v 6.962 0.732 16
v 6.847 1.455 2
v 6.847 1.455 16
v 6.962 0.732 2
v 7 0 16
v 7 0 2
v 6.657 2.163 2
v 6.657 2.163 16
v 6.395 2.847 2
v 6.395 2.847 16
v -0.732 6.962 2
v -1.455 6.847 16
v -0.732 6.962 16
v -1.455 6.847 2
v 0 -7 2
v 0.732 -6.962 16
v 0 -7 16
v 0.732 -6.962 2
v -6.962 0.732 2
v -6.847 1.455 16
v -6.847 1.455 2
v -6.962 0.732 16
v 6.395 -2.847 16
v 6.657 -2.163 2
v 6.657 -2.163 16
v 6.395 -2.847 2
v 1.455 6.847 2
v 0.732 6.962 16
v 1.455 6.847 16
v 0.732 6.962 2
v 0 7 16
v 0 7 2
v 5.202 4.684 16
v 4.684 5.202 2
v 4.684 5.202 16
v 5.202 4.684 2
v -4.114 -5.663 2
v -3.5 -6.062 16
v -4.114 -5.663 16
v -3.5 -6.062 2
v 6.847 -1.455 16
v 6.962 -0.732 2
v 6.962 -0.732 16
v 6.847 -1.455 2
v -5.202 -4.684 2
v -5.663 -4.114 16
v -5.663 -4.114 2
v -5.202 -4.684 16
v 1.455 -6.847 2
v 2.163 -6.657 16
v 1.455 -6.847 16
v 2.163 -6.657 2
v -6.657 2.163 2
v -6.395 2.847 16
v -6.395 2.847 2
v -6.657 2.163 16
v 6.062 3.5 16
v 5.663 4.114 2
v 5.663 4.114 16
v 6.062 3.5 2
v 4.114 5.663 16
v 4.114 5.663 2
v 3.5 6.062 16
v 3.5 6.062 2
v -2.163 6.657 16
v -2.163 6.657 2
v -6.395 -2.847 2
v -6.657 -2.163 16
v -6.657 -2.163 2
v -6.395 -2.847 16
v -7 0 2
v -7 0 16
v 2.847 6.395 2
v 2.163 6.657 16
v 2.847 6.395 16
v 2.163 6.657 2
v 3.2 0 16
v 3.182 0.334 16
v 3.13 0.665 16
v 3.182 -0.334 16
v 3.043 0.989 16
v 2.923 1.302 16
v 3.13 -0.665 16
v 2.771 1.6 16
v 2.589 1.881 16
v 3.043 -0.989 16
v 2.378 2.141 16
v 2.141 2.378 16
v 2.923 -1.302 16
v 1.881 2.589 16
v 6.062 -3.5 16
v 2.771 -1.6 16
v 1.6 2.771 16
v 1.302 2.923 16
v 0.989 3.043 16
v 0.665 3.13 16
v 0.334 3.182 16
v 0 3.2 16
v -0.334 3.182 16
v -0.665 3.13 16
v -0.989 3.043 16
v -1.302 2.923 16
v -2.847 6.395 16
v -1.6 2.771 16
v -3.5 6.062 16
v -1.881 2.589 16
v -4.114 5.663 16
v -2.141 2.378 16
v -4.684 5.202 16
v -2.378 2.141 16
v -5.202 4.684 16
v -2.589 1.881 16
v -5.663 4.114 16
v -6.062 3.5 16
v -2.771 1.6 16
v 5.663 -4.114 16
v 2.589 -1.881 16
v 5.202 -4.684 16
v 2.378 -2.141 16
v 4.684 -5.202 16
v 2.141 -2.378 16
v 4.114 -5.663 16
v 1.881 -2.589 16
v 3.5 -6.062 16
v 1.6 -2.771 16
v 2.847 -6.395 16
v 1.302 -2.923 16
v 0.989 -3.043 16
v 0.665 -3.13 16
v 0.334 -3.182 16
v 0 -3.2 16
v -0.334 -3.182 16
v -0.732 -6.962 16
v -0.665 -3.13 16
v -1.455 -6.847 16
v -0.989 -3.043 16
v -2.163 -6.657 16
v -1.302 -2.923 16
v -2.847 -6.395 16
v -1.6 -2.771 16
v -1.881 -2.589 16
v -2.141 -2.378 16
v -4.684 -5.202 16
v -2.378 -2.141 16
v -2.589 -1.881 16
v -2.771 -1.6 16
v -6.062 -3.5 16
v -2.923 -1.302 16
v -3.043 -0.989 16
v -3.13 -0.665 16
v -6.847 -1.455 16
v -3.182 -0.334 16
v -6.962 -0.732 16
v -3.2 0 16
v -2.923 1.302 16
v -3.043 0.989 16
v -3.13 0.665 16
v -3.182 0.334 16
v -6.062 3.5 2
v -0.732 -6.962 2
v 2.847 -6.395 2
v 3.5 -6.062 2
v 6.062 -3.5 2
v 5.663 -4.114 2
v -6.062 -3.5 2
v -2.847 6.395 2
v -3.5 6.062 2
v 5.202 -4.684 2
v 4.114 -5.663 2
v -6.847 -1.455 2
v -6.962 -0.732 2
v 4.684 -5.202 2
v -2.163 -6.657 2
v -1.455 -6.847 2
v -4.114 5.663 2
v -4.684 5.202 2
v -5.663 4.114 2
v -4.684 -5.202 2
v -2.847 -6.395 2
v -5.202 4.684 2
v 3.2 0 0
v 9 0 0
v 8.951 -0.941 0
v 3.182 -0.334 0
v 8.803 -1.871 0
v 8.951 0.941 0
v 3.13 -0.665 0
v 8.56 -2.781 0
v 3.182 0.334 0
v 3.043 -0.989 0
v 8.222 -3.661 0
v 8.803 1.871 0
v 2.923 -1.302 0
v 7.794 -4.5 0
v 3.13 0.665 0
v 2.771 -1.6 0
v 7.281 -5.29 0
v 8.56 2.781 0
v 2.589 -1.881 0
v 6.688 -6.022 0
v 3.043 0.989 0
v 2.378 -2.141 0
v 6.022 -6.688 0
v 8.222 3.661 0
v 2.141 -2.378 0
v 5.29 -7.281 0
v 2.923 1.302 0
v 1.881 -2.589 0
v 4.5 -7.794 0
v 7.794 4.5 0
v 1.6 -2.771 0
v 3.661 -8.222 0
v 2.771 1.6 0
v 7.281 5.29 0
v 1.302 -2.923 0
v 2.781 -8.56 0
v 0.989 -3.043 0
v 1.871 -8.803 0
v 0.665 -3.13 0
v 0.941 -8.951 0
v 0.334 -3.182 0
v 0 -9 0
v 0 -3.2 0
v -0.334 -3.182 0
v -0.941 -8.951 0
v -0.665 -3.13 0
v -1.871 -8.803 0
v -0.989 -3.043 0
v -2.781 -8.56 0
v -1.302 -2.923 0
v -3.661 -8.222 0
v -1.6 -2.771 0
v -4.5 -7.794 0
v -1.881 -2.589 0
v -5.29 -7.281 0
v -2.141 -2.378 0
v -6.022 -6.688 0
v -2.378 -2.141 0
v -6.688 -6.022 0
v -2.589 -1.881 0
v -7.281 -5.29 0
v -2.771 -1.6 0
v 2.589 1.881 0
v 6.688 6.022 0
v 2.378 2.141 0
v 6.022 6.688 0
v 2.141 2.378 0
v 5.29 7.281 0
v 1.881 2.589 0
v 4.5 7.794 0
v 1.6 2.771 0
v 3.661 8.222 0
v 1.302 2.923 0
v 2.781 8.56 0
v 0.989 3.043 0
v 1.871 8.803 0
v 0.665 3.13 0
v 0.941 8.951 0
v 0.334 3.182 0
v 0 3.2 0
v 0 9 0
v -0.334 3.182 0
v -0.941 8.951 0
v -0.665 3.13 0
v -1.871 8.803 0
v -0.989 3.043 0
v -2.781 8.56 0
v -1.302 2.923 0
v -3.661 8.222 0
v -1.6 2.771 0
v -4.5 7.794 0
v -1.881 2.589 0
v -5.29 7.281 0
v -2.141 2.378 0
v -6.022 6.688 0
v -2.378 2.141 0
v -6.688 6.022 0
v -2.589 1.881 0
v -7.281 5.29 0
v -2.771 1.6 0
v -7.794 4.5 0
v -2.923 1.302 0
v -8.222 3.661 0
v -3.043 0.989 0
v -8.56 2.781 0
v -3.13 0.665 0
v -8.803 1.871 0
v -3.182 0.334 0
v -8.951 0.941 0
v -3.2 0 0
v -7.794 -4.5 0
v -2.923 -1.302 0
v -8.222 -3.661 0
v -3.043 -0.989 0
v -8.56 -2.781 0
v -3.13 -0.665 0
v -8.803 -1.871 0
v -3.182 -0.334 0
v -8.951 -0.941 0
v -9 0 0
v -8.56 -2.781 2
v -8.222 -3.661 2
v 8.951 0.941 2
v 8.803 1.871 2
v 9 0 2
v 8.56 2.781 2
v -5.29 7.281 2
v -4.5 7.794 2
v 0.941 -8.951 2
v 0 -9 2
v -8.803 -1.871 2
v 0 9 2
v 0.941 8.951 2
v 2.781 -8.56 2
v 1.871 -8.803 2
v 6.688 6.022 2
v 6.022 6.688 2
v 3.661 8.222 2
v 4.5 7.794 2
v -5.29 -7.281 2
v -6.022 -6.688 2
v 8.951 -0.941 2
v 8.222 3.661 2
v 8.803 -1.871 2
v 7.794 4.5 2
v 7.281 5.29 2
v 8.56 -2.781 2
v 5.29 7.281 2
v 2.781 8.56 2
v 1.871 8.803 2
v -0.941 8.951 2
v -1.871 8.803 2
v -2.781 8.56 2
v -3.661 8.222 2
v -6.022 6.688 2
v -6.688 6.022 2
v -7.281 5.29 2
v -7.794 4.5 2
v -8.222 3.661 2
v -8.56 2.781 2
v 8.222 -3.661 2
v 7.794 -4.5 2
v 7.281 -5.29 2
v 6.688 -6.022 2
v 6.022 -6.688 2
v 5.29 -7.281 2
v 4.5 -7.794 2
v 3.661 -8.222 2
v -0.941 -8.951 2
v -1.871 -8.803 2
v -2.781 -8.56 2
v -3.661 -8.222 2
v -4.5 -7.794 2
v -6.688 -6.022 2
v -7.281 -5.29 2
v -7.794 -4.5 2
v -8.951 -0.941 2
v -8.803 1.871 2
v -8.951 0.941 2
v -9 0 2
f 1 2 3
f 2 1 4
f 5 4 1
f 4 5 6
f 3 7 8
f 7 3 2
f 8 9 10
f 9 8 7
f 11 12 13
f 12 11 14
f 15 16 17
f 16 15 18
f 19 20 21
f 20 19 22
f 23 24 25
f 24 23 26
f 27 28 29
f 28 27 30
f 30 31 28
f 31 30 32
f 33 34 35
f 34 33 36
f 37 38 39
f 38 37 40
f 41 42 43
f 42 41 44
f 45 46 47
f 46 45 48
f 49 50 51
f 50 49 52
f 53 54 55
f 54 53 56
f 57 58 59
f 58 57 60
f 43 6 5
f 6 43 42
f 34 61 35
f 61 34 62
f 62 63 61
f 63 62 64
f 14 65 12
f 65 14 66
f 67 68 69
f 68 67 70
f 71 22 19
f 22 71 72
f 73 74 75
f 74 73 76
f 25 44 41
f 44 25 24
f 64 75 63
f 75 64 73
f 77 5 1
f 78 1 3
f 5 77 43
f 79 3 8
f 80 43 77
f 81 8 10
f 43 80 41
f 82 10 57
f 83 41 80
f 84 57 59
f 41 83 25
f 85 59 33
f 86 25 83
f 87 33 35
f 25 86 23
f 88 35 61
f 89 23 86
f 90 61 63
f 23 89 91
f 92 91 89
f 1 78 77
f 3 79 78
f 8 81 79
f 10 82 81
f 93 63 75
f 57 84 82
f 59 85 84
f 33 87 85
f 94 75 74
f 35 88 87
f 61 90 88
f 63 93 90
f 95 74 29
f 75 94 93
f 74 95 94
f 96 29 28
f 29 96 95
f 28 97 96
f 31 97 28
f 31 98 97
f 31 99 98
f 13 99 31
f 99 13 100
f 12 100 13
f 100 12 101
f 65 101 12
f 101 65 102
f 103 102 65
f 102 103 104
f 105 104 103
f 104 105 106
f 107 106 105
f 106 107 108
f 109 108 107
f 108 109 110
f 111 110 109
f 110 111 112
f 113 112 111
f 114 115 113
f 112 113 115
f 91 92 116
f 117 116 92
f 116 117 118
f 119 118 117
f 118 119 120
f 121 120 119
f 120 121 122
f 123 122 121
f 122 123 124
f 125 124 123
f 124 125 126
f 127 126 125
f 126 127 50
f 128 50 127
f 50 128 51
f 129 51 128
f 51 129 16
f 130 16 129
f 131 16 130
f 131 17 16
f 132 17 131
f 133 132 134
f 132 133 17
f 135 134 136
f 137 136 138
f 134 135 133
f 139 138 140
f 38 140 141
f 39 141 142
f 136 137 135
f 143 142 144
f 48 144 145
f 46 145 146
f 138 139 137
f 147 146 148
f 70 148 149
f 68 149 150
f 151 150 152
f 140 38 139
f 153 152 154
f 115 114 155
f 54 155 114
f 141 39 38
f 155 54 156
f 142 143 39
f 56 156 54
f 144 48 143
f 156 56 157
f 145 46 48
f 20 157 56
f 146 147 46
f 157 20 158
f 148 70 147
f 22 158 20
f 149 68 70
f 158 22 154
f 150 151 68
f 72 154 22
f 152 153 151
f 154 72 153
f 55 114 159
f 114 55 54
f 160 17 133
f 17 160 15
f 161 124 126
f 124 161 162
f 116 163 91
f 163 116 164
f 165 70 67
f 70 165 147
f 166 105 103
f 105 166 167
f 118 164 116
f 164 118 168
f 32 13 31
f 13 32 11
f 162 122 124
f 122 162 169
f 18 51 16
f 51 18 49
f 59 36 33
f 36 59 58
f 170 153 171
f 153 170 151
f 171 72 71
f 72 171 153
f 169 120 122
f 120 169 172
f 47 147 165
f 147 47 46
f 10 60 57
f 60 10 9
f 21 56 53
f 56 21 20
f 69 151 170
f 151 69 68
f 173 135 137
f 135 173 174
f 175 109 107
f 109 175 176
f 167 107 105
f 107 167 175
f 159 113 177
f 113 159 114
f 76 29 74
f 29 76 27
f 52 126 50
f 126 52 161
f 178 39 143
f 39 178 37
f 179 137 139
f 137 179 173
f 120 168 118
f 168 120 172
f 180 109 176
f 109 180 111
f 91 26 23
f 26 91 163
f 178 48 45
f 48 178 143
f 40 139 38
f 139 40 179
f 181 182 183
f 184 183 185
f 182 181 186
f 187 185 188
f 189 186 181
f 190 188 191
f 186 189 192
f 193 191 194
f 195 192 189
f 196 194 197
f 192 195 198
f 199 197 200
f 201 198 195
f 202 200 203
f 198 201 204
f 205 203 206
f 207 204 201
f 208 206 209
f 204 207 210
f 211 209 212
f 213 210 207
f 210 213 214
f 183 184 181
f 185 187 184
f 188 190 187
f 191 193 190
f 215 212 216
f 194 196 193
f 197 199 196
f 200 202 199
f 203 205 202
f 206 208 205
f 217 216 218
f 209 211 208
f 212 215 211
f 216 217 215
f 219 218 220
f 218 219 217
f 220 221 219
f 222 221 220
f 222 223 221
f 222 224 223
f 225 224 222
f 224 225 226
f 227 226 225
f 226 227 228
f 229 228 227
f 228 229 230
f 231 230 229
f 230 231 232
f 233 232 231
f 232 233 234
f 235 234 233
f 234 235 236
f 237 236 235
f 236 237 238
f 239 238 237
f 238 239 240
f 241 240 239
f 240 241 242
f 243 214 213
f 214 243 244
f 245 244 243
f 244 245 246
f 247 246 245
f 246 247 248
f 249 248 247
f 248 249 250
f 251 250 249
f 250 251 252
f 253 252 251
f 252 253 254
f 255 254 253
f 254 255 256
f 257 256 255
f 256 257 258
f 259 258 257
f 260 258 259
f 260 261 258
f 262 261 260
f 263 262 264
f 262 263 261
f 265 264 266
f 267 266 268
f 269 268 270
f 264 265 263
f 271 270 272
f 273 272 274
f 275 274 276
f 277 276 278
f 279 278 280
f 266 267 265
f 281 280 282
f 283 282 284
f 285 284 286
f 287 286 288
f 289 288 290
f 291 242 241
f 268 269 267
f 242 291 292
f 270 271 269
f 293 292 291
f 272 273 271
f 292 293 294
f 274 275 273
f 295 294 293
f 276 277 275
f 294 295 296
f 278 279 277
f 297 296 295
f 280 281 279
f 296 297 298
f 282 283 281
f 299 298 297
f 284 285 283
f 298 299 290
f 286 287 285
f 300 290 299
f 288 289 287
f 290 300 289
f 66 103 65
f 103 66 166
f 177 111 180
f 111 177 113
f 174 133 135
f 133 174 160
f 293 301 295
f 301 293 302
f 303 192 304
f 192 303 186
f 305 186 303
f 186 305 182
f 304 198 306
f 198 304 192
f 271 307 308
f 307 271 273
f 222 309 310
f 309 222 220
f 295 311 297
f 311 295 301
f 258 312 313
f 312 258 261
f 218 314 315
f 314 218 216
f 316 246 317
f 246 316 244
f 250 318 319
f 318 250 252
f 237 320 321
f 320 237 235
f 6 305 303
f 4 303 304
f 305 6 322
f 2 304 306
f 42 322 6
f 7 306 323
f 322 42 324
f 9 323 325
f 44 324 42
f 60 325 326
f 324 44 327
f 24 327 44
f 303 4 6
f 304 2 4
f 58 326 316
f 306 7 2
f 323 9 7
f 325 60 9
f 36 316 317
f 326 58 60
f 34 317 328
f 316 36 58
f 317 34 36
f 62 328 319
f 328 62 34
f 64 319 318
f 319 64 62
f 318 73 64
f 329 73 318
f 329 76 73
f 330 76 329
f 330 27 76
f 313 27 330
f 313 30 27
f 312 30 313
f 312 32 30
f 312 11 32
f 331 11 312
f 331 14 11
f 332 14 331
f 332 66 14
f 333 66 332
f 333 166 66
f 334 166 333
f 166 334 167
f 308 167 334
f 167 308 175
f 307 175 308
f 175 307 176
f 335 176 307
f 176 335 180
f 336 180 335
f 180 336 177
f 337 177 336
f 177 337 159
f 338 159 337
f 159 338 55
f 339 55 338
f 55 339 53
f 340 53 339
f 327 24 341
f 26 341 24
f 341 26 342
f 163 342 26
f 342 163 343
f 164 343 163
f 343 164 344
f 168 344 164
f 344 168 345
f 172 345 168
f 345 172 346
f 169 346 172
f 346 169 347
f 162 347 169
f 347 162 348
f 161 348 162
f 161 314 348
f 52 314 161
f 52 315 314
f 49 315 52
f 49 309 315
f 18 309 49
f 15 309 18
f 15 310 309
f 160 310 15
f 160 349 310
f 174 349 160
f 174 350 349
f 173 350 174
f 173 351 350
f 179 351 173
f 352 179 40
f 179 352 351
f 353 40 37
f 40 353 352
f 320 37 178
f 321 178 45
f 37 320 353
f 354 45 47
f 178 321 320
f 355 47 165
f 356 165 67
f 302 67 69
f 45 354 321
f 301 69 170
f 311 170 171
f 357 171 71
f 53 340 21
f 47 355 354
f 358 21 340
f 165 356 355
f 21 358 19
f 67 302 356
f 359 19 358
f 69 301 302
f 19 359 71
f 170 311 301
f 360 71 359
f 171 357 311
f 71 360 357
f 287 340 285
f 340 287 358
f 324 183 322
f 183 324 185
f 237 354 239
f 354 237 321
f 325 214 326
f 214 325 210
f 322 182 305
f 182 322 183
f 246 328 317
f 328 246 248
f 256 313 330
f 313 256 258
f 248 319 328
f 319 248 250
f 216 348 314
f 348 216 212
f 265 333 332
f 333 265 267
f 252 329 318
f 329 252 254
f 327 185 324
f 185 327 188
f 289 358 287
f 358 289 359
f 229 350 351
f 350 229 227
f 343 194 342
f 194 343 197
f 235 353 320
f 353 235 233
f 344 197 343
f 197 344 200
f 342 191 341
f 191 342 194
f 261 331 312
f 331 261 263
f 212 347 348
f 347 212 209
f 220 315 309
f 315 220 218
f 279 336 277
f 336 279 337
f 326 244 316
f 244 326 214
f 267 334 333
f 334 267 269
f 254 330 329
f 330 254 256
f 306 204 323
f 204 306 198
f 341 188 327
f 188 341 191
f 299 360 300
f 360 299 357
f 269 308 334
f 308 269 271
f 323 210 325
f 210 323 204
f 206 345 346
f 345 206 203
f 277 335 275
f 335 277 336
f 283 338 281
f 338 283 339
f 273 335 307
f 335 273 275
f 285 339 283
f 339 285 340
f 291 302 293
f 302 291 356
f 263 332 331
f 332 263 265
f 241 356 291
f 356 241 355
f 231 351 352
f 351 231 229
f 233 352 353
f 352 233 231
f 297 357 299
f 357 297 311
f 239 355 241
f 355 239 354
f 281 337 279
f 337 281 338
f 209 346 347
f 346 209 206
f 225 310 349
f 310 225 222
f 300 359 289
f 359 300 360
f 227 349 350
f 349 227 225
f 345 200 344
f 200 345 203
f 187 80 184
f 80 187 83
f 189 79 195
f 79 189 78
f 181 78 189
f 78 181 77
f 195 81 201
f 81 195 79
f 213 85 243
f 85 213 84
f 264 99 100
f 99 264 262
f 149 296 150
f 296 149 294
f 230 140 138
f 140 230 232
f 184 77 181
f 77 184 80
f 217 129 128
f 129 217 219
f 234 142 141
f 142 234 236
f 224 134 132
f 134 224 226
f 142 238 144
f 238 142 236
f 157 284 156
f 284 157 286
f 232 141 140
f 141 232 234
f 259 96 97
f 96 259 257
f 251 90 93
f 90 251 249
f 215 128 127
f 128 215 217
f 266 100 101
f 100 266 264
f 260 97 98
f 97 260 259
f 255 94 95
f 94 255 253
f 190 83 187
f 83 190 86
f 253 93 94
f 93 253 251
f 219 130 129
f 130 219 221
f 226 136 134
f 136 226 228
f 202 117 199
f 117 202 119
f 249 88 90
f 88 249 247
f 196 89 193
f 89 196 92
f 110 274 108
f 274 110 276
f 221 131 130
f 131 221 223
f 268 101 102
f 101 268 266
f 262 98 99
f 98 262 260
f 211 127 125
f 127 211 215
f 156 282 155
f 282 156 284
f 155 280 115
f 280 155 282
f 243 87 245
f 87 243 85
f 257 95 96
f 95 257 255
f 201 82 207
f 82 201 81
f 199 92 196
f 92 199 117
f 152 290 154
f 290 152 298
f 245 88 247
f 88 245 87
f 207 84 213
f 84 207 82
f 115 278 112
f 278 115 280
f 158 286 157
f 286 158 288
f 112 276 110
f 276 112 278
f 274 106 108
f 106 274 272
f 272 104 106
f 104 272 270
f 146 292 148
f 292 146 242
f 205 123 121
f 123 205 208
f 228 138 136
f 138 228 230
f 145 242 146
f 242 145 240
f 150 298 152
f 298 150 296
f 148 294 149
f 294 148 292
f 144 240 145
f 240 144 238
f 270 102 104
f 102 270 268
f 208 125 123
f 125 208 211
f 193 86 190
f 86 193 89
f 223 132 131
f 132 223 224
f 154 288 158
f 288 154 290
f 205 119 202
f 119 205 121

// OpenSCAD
// Motor mounting standoff.
$fn = 60;
eps = 0.02;
thread_d = 6.4;
outer_d = 14;
length = 16;
difference() {
    union() { cylinder(d=outer_d,h=length); cylinder(d=outer_d+4,h=2); }
    translate([0,0,-eps]) cylinder(d=thread_d,h=length+2*eps);
}
